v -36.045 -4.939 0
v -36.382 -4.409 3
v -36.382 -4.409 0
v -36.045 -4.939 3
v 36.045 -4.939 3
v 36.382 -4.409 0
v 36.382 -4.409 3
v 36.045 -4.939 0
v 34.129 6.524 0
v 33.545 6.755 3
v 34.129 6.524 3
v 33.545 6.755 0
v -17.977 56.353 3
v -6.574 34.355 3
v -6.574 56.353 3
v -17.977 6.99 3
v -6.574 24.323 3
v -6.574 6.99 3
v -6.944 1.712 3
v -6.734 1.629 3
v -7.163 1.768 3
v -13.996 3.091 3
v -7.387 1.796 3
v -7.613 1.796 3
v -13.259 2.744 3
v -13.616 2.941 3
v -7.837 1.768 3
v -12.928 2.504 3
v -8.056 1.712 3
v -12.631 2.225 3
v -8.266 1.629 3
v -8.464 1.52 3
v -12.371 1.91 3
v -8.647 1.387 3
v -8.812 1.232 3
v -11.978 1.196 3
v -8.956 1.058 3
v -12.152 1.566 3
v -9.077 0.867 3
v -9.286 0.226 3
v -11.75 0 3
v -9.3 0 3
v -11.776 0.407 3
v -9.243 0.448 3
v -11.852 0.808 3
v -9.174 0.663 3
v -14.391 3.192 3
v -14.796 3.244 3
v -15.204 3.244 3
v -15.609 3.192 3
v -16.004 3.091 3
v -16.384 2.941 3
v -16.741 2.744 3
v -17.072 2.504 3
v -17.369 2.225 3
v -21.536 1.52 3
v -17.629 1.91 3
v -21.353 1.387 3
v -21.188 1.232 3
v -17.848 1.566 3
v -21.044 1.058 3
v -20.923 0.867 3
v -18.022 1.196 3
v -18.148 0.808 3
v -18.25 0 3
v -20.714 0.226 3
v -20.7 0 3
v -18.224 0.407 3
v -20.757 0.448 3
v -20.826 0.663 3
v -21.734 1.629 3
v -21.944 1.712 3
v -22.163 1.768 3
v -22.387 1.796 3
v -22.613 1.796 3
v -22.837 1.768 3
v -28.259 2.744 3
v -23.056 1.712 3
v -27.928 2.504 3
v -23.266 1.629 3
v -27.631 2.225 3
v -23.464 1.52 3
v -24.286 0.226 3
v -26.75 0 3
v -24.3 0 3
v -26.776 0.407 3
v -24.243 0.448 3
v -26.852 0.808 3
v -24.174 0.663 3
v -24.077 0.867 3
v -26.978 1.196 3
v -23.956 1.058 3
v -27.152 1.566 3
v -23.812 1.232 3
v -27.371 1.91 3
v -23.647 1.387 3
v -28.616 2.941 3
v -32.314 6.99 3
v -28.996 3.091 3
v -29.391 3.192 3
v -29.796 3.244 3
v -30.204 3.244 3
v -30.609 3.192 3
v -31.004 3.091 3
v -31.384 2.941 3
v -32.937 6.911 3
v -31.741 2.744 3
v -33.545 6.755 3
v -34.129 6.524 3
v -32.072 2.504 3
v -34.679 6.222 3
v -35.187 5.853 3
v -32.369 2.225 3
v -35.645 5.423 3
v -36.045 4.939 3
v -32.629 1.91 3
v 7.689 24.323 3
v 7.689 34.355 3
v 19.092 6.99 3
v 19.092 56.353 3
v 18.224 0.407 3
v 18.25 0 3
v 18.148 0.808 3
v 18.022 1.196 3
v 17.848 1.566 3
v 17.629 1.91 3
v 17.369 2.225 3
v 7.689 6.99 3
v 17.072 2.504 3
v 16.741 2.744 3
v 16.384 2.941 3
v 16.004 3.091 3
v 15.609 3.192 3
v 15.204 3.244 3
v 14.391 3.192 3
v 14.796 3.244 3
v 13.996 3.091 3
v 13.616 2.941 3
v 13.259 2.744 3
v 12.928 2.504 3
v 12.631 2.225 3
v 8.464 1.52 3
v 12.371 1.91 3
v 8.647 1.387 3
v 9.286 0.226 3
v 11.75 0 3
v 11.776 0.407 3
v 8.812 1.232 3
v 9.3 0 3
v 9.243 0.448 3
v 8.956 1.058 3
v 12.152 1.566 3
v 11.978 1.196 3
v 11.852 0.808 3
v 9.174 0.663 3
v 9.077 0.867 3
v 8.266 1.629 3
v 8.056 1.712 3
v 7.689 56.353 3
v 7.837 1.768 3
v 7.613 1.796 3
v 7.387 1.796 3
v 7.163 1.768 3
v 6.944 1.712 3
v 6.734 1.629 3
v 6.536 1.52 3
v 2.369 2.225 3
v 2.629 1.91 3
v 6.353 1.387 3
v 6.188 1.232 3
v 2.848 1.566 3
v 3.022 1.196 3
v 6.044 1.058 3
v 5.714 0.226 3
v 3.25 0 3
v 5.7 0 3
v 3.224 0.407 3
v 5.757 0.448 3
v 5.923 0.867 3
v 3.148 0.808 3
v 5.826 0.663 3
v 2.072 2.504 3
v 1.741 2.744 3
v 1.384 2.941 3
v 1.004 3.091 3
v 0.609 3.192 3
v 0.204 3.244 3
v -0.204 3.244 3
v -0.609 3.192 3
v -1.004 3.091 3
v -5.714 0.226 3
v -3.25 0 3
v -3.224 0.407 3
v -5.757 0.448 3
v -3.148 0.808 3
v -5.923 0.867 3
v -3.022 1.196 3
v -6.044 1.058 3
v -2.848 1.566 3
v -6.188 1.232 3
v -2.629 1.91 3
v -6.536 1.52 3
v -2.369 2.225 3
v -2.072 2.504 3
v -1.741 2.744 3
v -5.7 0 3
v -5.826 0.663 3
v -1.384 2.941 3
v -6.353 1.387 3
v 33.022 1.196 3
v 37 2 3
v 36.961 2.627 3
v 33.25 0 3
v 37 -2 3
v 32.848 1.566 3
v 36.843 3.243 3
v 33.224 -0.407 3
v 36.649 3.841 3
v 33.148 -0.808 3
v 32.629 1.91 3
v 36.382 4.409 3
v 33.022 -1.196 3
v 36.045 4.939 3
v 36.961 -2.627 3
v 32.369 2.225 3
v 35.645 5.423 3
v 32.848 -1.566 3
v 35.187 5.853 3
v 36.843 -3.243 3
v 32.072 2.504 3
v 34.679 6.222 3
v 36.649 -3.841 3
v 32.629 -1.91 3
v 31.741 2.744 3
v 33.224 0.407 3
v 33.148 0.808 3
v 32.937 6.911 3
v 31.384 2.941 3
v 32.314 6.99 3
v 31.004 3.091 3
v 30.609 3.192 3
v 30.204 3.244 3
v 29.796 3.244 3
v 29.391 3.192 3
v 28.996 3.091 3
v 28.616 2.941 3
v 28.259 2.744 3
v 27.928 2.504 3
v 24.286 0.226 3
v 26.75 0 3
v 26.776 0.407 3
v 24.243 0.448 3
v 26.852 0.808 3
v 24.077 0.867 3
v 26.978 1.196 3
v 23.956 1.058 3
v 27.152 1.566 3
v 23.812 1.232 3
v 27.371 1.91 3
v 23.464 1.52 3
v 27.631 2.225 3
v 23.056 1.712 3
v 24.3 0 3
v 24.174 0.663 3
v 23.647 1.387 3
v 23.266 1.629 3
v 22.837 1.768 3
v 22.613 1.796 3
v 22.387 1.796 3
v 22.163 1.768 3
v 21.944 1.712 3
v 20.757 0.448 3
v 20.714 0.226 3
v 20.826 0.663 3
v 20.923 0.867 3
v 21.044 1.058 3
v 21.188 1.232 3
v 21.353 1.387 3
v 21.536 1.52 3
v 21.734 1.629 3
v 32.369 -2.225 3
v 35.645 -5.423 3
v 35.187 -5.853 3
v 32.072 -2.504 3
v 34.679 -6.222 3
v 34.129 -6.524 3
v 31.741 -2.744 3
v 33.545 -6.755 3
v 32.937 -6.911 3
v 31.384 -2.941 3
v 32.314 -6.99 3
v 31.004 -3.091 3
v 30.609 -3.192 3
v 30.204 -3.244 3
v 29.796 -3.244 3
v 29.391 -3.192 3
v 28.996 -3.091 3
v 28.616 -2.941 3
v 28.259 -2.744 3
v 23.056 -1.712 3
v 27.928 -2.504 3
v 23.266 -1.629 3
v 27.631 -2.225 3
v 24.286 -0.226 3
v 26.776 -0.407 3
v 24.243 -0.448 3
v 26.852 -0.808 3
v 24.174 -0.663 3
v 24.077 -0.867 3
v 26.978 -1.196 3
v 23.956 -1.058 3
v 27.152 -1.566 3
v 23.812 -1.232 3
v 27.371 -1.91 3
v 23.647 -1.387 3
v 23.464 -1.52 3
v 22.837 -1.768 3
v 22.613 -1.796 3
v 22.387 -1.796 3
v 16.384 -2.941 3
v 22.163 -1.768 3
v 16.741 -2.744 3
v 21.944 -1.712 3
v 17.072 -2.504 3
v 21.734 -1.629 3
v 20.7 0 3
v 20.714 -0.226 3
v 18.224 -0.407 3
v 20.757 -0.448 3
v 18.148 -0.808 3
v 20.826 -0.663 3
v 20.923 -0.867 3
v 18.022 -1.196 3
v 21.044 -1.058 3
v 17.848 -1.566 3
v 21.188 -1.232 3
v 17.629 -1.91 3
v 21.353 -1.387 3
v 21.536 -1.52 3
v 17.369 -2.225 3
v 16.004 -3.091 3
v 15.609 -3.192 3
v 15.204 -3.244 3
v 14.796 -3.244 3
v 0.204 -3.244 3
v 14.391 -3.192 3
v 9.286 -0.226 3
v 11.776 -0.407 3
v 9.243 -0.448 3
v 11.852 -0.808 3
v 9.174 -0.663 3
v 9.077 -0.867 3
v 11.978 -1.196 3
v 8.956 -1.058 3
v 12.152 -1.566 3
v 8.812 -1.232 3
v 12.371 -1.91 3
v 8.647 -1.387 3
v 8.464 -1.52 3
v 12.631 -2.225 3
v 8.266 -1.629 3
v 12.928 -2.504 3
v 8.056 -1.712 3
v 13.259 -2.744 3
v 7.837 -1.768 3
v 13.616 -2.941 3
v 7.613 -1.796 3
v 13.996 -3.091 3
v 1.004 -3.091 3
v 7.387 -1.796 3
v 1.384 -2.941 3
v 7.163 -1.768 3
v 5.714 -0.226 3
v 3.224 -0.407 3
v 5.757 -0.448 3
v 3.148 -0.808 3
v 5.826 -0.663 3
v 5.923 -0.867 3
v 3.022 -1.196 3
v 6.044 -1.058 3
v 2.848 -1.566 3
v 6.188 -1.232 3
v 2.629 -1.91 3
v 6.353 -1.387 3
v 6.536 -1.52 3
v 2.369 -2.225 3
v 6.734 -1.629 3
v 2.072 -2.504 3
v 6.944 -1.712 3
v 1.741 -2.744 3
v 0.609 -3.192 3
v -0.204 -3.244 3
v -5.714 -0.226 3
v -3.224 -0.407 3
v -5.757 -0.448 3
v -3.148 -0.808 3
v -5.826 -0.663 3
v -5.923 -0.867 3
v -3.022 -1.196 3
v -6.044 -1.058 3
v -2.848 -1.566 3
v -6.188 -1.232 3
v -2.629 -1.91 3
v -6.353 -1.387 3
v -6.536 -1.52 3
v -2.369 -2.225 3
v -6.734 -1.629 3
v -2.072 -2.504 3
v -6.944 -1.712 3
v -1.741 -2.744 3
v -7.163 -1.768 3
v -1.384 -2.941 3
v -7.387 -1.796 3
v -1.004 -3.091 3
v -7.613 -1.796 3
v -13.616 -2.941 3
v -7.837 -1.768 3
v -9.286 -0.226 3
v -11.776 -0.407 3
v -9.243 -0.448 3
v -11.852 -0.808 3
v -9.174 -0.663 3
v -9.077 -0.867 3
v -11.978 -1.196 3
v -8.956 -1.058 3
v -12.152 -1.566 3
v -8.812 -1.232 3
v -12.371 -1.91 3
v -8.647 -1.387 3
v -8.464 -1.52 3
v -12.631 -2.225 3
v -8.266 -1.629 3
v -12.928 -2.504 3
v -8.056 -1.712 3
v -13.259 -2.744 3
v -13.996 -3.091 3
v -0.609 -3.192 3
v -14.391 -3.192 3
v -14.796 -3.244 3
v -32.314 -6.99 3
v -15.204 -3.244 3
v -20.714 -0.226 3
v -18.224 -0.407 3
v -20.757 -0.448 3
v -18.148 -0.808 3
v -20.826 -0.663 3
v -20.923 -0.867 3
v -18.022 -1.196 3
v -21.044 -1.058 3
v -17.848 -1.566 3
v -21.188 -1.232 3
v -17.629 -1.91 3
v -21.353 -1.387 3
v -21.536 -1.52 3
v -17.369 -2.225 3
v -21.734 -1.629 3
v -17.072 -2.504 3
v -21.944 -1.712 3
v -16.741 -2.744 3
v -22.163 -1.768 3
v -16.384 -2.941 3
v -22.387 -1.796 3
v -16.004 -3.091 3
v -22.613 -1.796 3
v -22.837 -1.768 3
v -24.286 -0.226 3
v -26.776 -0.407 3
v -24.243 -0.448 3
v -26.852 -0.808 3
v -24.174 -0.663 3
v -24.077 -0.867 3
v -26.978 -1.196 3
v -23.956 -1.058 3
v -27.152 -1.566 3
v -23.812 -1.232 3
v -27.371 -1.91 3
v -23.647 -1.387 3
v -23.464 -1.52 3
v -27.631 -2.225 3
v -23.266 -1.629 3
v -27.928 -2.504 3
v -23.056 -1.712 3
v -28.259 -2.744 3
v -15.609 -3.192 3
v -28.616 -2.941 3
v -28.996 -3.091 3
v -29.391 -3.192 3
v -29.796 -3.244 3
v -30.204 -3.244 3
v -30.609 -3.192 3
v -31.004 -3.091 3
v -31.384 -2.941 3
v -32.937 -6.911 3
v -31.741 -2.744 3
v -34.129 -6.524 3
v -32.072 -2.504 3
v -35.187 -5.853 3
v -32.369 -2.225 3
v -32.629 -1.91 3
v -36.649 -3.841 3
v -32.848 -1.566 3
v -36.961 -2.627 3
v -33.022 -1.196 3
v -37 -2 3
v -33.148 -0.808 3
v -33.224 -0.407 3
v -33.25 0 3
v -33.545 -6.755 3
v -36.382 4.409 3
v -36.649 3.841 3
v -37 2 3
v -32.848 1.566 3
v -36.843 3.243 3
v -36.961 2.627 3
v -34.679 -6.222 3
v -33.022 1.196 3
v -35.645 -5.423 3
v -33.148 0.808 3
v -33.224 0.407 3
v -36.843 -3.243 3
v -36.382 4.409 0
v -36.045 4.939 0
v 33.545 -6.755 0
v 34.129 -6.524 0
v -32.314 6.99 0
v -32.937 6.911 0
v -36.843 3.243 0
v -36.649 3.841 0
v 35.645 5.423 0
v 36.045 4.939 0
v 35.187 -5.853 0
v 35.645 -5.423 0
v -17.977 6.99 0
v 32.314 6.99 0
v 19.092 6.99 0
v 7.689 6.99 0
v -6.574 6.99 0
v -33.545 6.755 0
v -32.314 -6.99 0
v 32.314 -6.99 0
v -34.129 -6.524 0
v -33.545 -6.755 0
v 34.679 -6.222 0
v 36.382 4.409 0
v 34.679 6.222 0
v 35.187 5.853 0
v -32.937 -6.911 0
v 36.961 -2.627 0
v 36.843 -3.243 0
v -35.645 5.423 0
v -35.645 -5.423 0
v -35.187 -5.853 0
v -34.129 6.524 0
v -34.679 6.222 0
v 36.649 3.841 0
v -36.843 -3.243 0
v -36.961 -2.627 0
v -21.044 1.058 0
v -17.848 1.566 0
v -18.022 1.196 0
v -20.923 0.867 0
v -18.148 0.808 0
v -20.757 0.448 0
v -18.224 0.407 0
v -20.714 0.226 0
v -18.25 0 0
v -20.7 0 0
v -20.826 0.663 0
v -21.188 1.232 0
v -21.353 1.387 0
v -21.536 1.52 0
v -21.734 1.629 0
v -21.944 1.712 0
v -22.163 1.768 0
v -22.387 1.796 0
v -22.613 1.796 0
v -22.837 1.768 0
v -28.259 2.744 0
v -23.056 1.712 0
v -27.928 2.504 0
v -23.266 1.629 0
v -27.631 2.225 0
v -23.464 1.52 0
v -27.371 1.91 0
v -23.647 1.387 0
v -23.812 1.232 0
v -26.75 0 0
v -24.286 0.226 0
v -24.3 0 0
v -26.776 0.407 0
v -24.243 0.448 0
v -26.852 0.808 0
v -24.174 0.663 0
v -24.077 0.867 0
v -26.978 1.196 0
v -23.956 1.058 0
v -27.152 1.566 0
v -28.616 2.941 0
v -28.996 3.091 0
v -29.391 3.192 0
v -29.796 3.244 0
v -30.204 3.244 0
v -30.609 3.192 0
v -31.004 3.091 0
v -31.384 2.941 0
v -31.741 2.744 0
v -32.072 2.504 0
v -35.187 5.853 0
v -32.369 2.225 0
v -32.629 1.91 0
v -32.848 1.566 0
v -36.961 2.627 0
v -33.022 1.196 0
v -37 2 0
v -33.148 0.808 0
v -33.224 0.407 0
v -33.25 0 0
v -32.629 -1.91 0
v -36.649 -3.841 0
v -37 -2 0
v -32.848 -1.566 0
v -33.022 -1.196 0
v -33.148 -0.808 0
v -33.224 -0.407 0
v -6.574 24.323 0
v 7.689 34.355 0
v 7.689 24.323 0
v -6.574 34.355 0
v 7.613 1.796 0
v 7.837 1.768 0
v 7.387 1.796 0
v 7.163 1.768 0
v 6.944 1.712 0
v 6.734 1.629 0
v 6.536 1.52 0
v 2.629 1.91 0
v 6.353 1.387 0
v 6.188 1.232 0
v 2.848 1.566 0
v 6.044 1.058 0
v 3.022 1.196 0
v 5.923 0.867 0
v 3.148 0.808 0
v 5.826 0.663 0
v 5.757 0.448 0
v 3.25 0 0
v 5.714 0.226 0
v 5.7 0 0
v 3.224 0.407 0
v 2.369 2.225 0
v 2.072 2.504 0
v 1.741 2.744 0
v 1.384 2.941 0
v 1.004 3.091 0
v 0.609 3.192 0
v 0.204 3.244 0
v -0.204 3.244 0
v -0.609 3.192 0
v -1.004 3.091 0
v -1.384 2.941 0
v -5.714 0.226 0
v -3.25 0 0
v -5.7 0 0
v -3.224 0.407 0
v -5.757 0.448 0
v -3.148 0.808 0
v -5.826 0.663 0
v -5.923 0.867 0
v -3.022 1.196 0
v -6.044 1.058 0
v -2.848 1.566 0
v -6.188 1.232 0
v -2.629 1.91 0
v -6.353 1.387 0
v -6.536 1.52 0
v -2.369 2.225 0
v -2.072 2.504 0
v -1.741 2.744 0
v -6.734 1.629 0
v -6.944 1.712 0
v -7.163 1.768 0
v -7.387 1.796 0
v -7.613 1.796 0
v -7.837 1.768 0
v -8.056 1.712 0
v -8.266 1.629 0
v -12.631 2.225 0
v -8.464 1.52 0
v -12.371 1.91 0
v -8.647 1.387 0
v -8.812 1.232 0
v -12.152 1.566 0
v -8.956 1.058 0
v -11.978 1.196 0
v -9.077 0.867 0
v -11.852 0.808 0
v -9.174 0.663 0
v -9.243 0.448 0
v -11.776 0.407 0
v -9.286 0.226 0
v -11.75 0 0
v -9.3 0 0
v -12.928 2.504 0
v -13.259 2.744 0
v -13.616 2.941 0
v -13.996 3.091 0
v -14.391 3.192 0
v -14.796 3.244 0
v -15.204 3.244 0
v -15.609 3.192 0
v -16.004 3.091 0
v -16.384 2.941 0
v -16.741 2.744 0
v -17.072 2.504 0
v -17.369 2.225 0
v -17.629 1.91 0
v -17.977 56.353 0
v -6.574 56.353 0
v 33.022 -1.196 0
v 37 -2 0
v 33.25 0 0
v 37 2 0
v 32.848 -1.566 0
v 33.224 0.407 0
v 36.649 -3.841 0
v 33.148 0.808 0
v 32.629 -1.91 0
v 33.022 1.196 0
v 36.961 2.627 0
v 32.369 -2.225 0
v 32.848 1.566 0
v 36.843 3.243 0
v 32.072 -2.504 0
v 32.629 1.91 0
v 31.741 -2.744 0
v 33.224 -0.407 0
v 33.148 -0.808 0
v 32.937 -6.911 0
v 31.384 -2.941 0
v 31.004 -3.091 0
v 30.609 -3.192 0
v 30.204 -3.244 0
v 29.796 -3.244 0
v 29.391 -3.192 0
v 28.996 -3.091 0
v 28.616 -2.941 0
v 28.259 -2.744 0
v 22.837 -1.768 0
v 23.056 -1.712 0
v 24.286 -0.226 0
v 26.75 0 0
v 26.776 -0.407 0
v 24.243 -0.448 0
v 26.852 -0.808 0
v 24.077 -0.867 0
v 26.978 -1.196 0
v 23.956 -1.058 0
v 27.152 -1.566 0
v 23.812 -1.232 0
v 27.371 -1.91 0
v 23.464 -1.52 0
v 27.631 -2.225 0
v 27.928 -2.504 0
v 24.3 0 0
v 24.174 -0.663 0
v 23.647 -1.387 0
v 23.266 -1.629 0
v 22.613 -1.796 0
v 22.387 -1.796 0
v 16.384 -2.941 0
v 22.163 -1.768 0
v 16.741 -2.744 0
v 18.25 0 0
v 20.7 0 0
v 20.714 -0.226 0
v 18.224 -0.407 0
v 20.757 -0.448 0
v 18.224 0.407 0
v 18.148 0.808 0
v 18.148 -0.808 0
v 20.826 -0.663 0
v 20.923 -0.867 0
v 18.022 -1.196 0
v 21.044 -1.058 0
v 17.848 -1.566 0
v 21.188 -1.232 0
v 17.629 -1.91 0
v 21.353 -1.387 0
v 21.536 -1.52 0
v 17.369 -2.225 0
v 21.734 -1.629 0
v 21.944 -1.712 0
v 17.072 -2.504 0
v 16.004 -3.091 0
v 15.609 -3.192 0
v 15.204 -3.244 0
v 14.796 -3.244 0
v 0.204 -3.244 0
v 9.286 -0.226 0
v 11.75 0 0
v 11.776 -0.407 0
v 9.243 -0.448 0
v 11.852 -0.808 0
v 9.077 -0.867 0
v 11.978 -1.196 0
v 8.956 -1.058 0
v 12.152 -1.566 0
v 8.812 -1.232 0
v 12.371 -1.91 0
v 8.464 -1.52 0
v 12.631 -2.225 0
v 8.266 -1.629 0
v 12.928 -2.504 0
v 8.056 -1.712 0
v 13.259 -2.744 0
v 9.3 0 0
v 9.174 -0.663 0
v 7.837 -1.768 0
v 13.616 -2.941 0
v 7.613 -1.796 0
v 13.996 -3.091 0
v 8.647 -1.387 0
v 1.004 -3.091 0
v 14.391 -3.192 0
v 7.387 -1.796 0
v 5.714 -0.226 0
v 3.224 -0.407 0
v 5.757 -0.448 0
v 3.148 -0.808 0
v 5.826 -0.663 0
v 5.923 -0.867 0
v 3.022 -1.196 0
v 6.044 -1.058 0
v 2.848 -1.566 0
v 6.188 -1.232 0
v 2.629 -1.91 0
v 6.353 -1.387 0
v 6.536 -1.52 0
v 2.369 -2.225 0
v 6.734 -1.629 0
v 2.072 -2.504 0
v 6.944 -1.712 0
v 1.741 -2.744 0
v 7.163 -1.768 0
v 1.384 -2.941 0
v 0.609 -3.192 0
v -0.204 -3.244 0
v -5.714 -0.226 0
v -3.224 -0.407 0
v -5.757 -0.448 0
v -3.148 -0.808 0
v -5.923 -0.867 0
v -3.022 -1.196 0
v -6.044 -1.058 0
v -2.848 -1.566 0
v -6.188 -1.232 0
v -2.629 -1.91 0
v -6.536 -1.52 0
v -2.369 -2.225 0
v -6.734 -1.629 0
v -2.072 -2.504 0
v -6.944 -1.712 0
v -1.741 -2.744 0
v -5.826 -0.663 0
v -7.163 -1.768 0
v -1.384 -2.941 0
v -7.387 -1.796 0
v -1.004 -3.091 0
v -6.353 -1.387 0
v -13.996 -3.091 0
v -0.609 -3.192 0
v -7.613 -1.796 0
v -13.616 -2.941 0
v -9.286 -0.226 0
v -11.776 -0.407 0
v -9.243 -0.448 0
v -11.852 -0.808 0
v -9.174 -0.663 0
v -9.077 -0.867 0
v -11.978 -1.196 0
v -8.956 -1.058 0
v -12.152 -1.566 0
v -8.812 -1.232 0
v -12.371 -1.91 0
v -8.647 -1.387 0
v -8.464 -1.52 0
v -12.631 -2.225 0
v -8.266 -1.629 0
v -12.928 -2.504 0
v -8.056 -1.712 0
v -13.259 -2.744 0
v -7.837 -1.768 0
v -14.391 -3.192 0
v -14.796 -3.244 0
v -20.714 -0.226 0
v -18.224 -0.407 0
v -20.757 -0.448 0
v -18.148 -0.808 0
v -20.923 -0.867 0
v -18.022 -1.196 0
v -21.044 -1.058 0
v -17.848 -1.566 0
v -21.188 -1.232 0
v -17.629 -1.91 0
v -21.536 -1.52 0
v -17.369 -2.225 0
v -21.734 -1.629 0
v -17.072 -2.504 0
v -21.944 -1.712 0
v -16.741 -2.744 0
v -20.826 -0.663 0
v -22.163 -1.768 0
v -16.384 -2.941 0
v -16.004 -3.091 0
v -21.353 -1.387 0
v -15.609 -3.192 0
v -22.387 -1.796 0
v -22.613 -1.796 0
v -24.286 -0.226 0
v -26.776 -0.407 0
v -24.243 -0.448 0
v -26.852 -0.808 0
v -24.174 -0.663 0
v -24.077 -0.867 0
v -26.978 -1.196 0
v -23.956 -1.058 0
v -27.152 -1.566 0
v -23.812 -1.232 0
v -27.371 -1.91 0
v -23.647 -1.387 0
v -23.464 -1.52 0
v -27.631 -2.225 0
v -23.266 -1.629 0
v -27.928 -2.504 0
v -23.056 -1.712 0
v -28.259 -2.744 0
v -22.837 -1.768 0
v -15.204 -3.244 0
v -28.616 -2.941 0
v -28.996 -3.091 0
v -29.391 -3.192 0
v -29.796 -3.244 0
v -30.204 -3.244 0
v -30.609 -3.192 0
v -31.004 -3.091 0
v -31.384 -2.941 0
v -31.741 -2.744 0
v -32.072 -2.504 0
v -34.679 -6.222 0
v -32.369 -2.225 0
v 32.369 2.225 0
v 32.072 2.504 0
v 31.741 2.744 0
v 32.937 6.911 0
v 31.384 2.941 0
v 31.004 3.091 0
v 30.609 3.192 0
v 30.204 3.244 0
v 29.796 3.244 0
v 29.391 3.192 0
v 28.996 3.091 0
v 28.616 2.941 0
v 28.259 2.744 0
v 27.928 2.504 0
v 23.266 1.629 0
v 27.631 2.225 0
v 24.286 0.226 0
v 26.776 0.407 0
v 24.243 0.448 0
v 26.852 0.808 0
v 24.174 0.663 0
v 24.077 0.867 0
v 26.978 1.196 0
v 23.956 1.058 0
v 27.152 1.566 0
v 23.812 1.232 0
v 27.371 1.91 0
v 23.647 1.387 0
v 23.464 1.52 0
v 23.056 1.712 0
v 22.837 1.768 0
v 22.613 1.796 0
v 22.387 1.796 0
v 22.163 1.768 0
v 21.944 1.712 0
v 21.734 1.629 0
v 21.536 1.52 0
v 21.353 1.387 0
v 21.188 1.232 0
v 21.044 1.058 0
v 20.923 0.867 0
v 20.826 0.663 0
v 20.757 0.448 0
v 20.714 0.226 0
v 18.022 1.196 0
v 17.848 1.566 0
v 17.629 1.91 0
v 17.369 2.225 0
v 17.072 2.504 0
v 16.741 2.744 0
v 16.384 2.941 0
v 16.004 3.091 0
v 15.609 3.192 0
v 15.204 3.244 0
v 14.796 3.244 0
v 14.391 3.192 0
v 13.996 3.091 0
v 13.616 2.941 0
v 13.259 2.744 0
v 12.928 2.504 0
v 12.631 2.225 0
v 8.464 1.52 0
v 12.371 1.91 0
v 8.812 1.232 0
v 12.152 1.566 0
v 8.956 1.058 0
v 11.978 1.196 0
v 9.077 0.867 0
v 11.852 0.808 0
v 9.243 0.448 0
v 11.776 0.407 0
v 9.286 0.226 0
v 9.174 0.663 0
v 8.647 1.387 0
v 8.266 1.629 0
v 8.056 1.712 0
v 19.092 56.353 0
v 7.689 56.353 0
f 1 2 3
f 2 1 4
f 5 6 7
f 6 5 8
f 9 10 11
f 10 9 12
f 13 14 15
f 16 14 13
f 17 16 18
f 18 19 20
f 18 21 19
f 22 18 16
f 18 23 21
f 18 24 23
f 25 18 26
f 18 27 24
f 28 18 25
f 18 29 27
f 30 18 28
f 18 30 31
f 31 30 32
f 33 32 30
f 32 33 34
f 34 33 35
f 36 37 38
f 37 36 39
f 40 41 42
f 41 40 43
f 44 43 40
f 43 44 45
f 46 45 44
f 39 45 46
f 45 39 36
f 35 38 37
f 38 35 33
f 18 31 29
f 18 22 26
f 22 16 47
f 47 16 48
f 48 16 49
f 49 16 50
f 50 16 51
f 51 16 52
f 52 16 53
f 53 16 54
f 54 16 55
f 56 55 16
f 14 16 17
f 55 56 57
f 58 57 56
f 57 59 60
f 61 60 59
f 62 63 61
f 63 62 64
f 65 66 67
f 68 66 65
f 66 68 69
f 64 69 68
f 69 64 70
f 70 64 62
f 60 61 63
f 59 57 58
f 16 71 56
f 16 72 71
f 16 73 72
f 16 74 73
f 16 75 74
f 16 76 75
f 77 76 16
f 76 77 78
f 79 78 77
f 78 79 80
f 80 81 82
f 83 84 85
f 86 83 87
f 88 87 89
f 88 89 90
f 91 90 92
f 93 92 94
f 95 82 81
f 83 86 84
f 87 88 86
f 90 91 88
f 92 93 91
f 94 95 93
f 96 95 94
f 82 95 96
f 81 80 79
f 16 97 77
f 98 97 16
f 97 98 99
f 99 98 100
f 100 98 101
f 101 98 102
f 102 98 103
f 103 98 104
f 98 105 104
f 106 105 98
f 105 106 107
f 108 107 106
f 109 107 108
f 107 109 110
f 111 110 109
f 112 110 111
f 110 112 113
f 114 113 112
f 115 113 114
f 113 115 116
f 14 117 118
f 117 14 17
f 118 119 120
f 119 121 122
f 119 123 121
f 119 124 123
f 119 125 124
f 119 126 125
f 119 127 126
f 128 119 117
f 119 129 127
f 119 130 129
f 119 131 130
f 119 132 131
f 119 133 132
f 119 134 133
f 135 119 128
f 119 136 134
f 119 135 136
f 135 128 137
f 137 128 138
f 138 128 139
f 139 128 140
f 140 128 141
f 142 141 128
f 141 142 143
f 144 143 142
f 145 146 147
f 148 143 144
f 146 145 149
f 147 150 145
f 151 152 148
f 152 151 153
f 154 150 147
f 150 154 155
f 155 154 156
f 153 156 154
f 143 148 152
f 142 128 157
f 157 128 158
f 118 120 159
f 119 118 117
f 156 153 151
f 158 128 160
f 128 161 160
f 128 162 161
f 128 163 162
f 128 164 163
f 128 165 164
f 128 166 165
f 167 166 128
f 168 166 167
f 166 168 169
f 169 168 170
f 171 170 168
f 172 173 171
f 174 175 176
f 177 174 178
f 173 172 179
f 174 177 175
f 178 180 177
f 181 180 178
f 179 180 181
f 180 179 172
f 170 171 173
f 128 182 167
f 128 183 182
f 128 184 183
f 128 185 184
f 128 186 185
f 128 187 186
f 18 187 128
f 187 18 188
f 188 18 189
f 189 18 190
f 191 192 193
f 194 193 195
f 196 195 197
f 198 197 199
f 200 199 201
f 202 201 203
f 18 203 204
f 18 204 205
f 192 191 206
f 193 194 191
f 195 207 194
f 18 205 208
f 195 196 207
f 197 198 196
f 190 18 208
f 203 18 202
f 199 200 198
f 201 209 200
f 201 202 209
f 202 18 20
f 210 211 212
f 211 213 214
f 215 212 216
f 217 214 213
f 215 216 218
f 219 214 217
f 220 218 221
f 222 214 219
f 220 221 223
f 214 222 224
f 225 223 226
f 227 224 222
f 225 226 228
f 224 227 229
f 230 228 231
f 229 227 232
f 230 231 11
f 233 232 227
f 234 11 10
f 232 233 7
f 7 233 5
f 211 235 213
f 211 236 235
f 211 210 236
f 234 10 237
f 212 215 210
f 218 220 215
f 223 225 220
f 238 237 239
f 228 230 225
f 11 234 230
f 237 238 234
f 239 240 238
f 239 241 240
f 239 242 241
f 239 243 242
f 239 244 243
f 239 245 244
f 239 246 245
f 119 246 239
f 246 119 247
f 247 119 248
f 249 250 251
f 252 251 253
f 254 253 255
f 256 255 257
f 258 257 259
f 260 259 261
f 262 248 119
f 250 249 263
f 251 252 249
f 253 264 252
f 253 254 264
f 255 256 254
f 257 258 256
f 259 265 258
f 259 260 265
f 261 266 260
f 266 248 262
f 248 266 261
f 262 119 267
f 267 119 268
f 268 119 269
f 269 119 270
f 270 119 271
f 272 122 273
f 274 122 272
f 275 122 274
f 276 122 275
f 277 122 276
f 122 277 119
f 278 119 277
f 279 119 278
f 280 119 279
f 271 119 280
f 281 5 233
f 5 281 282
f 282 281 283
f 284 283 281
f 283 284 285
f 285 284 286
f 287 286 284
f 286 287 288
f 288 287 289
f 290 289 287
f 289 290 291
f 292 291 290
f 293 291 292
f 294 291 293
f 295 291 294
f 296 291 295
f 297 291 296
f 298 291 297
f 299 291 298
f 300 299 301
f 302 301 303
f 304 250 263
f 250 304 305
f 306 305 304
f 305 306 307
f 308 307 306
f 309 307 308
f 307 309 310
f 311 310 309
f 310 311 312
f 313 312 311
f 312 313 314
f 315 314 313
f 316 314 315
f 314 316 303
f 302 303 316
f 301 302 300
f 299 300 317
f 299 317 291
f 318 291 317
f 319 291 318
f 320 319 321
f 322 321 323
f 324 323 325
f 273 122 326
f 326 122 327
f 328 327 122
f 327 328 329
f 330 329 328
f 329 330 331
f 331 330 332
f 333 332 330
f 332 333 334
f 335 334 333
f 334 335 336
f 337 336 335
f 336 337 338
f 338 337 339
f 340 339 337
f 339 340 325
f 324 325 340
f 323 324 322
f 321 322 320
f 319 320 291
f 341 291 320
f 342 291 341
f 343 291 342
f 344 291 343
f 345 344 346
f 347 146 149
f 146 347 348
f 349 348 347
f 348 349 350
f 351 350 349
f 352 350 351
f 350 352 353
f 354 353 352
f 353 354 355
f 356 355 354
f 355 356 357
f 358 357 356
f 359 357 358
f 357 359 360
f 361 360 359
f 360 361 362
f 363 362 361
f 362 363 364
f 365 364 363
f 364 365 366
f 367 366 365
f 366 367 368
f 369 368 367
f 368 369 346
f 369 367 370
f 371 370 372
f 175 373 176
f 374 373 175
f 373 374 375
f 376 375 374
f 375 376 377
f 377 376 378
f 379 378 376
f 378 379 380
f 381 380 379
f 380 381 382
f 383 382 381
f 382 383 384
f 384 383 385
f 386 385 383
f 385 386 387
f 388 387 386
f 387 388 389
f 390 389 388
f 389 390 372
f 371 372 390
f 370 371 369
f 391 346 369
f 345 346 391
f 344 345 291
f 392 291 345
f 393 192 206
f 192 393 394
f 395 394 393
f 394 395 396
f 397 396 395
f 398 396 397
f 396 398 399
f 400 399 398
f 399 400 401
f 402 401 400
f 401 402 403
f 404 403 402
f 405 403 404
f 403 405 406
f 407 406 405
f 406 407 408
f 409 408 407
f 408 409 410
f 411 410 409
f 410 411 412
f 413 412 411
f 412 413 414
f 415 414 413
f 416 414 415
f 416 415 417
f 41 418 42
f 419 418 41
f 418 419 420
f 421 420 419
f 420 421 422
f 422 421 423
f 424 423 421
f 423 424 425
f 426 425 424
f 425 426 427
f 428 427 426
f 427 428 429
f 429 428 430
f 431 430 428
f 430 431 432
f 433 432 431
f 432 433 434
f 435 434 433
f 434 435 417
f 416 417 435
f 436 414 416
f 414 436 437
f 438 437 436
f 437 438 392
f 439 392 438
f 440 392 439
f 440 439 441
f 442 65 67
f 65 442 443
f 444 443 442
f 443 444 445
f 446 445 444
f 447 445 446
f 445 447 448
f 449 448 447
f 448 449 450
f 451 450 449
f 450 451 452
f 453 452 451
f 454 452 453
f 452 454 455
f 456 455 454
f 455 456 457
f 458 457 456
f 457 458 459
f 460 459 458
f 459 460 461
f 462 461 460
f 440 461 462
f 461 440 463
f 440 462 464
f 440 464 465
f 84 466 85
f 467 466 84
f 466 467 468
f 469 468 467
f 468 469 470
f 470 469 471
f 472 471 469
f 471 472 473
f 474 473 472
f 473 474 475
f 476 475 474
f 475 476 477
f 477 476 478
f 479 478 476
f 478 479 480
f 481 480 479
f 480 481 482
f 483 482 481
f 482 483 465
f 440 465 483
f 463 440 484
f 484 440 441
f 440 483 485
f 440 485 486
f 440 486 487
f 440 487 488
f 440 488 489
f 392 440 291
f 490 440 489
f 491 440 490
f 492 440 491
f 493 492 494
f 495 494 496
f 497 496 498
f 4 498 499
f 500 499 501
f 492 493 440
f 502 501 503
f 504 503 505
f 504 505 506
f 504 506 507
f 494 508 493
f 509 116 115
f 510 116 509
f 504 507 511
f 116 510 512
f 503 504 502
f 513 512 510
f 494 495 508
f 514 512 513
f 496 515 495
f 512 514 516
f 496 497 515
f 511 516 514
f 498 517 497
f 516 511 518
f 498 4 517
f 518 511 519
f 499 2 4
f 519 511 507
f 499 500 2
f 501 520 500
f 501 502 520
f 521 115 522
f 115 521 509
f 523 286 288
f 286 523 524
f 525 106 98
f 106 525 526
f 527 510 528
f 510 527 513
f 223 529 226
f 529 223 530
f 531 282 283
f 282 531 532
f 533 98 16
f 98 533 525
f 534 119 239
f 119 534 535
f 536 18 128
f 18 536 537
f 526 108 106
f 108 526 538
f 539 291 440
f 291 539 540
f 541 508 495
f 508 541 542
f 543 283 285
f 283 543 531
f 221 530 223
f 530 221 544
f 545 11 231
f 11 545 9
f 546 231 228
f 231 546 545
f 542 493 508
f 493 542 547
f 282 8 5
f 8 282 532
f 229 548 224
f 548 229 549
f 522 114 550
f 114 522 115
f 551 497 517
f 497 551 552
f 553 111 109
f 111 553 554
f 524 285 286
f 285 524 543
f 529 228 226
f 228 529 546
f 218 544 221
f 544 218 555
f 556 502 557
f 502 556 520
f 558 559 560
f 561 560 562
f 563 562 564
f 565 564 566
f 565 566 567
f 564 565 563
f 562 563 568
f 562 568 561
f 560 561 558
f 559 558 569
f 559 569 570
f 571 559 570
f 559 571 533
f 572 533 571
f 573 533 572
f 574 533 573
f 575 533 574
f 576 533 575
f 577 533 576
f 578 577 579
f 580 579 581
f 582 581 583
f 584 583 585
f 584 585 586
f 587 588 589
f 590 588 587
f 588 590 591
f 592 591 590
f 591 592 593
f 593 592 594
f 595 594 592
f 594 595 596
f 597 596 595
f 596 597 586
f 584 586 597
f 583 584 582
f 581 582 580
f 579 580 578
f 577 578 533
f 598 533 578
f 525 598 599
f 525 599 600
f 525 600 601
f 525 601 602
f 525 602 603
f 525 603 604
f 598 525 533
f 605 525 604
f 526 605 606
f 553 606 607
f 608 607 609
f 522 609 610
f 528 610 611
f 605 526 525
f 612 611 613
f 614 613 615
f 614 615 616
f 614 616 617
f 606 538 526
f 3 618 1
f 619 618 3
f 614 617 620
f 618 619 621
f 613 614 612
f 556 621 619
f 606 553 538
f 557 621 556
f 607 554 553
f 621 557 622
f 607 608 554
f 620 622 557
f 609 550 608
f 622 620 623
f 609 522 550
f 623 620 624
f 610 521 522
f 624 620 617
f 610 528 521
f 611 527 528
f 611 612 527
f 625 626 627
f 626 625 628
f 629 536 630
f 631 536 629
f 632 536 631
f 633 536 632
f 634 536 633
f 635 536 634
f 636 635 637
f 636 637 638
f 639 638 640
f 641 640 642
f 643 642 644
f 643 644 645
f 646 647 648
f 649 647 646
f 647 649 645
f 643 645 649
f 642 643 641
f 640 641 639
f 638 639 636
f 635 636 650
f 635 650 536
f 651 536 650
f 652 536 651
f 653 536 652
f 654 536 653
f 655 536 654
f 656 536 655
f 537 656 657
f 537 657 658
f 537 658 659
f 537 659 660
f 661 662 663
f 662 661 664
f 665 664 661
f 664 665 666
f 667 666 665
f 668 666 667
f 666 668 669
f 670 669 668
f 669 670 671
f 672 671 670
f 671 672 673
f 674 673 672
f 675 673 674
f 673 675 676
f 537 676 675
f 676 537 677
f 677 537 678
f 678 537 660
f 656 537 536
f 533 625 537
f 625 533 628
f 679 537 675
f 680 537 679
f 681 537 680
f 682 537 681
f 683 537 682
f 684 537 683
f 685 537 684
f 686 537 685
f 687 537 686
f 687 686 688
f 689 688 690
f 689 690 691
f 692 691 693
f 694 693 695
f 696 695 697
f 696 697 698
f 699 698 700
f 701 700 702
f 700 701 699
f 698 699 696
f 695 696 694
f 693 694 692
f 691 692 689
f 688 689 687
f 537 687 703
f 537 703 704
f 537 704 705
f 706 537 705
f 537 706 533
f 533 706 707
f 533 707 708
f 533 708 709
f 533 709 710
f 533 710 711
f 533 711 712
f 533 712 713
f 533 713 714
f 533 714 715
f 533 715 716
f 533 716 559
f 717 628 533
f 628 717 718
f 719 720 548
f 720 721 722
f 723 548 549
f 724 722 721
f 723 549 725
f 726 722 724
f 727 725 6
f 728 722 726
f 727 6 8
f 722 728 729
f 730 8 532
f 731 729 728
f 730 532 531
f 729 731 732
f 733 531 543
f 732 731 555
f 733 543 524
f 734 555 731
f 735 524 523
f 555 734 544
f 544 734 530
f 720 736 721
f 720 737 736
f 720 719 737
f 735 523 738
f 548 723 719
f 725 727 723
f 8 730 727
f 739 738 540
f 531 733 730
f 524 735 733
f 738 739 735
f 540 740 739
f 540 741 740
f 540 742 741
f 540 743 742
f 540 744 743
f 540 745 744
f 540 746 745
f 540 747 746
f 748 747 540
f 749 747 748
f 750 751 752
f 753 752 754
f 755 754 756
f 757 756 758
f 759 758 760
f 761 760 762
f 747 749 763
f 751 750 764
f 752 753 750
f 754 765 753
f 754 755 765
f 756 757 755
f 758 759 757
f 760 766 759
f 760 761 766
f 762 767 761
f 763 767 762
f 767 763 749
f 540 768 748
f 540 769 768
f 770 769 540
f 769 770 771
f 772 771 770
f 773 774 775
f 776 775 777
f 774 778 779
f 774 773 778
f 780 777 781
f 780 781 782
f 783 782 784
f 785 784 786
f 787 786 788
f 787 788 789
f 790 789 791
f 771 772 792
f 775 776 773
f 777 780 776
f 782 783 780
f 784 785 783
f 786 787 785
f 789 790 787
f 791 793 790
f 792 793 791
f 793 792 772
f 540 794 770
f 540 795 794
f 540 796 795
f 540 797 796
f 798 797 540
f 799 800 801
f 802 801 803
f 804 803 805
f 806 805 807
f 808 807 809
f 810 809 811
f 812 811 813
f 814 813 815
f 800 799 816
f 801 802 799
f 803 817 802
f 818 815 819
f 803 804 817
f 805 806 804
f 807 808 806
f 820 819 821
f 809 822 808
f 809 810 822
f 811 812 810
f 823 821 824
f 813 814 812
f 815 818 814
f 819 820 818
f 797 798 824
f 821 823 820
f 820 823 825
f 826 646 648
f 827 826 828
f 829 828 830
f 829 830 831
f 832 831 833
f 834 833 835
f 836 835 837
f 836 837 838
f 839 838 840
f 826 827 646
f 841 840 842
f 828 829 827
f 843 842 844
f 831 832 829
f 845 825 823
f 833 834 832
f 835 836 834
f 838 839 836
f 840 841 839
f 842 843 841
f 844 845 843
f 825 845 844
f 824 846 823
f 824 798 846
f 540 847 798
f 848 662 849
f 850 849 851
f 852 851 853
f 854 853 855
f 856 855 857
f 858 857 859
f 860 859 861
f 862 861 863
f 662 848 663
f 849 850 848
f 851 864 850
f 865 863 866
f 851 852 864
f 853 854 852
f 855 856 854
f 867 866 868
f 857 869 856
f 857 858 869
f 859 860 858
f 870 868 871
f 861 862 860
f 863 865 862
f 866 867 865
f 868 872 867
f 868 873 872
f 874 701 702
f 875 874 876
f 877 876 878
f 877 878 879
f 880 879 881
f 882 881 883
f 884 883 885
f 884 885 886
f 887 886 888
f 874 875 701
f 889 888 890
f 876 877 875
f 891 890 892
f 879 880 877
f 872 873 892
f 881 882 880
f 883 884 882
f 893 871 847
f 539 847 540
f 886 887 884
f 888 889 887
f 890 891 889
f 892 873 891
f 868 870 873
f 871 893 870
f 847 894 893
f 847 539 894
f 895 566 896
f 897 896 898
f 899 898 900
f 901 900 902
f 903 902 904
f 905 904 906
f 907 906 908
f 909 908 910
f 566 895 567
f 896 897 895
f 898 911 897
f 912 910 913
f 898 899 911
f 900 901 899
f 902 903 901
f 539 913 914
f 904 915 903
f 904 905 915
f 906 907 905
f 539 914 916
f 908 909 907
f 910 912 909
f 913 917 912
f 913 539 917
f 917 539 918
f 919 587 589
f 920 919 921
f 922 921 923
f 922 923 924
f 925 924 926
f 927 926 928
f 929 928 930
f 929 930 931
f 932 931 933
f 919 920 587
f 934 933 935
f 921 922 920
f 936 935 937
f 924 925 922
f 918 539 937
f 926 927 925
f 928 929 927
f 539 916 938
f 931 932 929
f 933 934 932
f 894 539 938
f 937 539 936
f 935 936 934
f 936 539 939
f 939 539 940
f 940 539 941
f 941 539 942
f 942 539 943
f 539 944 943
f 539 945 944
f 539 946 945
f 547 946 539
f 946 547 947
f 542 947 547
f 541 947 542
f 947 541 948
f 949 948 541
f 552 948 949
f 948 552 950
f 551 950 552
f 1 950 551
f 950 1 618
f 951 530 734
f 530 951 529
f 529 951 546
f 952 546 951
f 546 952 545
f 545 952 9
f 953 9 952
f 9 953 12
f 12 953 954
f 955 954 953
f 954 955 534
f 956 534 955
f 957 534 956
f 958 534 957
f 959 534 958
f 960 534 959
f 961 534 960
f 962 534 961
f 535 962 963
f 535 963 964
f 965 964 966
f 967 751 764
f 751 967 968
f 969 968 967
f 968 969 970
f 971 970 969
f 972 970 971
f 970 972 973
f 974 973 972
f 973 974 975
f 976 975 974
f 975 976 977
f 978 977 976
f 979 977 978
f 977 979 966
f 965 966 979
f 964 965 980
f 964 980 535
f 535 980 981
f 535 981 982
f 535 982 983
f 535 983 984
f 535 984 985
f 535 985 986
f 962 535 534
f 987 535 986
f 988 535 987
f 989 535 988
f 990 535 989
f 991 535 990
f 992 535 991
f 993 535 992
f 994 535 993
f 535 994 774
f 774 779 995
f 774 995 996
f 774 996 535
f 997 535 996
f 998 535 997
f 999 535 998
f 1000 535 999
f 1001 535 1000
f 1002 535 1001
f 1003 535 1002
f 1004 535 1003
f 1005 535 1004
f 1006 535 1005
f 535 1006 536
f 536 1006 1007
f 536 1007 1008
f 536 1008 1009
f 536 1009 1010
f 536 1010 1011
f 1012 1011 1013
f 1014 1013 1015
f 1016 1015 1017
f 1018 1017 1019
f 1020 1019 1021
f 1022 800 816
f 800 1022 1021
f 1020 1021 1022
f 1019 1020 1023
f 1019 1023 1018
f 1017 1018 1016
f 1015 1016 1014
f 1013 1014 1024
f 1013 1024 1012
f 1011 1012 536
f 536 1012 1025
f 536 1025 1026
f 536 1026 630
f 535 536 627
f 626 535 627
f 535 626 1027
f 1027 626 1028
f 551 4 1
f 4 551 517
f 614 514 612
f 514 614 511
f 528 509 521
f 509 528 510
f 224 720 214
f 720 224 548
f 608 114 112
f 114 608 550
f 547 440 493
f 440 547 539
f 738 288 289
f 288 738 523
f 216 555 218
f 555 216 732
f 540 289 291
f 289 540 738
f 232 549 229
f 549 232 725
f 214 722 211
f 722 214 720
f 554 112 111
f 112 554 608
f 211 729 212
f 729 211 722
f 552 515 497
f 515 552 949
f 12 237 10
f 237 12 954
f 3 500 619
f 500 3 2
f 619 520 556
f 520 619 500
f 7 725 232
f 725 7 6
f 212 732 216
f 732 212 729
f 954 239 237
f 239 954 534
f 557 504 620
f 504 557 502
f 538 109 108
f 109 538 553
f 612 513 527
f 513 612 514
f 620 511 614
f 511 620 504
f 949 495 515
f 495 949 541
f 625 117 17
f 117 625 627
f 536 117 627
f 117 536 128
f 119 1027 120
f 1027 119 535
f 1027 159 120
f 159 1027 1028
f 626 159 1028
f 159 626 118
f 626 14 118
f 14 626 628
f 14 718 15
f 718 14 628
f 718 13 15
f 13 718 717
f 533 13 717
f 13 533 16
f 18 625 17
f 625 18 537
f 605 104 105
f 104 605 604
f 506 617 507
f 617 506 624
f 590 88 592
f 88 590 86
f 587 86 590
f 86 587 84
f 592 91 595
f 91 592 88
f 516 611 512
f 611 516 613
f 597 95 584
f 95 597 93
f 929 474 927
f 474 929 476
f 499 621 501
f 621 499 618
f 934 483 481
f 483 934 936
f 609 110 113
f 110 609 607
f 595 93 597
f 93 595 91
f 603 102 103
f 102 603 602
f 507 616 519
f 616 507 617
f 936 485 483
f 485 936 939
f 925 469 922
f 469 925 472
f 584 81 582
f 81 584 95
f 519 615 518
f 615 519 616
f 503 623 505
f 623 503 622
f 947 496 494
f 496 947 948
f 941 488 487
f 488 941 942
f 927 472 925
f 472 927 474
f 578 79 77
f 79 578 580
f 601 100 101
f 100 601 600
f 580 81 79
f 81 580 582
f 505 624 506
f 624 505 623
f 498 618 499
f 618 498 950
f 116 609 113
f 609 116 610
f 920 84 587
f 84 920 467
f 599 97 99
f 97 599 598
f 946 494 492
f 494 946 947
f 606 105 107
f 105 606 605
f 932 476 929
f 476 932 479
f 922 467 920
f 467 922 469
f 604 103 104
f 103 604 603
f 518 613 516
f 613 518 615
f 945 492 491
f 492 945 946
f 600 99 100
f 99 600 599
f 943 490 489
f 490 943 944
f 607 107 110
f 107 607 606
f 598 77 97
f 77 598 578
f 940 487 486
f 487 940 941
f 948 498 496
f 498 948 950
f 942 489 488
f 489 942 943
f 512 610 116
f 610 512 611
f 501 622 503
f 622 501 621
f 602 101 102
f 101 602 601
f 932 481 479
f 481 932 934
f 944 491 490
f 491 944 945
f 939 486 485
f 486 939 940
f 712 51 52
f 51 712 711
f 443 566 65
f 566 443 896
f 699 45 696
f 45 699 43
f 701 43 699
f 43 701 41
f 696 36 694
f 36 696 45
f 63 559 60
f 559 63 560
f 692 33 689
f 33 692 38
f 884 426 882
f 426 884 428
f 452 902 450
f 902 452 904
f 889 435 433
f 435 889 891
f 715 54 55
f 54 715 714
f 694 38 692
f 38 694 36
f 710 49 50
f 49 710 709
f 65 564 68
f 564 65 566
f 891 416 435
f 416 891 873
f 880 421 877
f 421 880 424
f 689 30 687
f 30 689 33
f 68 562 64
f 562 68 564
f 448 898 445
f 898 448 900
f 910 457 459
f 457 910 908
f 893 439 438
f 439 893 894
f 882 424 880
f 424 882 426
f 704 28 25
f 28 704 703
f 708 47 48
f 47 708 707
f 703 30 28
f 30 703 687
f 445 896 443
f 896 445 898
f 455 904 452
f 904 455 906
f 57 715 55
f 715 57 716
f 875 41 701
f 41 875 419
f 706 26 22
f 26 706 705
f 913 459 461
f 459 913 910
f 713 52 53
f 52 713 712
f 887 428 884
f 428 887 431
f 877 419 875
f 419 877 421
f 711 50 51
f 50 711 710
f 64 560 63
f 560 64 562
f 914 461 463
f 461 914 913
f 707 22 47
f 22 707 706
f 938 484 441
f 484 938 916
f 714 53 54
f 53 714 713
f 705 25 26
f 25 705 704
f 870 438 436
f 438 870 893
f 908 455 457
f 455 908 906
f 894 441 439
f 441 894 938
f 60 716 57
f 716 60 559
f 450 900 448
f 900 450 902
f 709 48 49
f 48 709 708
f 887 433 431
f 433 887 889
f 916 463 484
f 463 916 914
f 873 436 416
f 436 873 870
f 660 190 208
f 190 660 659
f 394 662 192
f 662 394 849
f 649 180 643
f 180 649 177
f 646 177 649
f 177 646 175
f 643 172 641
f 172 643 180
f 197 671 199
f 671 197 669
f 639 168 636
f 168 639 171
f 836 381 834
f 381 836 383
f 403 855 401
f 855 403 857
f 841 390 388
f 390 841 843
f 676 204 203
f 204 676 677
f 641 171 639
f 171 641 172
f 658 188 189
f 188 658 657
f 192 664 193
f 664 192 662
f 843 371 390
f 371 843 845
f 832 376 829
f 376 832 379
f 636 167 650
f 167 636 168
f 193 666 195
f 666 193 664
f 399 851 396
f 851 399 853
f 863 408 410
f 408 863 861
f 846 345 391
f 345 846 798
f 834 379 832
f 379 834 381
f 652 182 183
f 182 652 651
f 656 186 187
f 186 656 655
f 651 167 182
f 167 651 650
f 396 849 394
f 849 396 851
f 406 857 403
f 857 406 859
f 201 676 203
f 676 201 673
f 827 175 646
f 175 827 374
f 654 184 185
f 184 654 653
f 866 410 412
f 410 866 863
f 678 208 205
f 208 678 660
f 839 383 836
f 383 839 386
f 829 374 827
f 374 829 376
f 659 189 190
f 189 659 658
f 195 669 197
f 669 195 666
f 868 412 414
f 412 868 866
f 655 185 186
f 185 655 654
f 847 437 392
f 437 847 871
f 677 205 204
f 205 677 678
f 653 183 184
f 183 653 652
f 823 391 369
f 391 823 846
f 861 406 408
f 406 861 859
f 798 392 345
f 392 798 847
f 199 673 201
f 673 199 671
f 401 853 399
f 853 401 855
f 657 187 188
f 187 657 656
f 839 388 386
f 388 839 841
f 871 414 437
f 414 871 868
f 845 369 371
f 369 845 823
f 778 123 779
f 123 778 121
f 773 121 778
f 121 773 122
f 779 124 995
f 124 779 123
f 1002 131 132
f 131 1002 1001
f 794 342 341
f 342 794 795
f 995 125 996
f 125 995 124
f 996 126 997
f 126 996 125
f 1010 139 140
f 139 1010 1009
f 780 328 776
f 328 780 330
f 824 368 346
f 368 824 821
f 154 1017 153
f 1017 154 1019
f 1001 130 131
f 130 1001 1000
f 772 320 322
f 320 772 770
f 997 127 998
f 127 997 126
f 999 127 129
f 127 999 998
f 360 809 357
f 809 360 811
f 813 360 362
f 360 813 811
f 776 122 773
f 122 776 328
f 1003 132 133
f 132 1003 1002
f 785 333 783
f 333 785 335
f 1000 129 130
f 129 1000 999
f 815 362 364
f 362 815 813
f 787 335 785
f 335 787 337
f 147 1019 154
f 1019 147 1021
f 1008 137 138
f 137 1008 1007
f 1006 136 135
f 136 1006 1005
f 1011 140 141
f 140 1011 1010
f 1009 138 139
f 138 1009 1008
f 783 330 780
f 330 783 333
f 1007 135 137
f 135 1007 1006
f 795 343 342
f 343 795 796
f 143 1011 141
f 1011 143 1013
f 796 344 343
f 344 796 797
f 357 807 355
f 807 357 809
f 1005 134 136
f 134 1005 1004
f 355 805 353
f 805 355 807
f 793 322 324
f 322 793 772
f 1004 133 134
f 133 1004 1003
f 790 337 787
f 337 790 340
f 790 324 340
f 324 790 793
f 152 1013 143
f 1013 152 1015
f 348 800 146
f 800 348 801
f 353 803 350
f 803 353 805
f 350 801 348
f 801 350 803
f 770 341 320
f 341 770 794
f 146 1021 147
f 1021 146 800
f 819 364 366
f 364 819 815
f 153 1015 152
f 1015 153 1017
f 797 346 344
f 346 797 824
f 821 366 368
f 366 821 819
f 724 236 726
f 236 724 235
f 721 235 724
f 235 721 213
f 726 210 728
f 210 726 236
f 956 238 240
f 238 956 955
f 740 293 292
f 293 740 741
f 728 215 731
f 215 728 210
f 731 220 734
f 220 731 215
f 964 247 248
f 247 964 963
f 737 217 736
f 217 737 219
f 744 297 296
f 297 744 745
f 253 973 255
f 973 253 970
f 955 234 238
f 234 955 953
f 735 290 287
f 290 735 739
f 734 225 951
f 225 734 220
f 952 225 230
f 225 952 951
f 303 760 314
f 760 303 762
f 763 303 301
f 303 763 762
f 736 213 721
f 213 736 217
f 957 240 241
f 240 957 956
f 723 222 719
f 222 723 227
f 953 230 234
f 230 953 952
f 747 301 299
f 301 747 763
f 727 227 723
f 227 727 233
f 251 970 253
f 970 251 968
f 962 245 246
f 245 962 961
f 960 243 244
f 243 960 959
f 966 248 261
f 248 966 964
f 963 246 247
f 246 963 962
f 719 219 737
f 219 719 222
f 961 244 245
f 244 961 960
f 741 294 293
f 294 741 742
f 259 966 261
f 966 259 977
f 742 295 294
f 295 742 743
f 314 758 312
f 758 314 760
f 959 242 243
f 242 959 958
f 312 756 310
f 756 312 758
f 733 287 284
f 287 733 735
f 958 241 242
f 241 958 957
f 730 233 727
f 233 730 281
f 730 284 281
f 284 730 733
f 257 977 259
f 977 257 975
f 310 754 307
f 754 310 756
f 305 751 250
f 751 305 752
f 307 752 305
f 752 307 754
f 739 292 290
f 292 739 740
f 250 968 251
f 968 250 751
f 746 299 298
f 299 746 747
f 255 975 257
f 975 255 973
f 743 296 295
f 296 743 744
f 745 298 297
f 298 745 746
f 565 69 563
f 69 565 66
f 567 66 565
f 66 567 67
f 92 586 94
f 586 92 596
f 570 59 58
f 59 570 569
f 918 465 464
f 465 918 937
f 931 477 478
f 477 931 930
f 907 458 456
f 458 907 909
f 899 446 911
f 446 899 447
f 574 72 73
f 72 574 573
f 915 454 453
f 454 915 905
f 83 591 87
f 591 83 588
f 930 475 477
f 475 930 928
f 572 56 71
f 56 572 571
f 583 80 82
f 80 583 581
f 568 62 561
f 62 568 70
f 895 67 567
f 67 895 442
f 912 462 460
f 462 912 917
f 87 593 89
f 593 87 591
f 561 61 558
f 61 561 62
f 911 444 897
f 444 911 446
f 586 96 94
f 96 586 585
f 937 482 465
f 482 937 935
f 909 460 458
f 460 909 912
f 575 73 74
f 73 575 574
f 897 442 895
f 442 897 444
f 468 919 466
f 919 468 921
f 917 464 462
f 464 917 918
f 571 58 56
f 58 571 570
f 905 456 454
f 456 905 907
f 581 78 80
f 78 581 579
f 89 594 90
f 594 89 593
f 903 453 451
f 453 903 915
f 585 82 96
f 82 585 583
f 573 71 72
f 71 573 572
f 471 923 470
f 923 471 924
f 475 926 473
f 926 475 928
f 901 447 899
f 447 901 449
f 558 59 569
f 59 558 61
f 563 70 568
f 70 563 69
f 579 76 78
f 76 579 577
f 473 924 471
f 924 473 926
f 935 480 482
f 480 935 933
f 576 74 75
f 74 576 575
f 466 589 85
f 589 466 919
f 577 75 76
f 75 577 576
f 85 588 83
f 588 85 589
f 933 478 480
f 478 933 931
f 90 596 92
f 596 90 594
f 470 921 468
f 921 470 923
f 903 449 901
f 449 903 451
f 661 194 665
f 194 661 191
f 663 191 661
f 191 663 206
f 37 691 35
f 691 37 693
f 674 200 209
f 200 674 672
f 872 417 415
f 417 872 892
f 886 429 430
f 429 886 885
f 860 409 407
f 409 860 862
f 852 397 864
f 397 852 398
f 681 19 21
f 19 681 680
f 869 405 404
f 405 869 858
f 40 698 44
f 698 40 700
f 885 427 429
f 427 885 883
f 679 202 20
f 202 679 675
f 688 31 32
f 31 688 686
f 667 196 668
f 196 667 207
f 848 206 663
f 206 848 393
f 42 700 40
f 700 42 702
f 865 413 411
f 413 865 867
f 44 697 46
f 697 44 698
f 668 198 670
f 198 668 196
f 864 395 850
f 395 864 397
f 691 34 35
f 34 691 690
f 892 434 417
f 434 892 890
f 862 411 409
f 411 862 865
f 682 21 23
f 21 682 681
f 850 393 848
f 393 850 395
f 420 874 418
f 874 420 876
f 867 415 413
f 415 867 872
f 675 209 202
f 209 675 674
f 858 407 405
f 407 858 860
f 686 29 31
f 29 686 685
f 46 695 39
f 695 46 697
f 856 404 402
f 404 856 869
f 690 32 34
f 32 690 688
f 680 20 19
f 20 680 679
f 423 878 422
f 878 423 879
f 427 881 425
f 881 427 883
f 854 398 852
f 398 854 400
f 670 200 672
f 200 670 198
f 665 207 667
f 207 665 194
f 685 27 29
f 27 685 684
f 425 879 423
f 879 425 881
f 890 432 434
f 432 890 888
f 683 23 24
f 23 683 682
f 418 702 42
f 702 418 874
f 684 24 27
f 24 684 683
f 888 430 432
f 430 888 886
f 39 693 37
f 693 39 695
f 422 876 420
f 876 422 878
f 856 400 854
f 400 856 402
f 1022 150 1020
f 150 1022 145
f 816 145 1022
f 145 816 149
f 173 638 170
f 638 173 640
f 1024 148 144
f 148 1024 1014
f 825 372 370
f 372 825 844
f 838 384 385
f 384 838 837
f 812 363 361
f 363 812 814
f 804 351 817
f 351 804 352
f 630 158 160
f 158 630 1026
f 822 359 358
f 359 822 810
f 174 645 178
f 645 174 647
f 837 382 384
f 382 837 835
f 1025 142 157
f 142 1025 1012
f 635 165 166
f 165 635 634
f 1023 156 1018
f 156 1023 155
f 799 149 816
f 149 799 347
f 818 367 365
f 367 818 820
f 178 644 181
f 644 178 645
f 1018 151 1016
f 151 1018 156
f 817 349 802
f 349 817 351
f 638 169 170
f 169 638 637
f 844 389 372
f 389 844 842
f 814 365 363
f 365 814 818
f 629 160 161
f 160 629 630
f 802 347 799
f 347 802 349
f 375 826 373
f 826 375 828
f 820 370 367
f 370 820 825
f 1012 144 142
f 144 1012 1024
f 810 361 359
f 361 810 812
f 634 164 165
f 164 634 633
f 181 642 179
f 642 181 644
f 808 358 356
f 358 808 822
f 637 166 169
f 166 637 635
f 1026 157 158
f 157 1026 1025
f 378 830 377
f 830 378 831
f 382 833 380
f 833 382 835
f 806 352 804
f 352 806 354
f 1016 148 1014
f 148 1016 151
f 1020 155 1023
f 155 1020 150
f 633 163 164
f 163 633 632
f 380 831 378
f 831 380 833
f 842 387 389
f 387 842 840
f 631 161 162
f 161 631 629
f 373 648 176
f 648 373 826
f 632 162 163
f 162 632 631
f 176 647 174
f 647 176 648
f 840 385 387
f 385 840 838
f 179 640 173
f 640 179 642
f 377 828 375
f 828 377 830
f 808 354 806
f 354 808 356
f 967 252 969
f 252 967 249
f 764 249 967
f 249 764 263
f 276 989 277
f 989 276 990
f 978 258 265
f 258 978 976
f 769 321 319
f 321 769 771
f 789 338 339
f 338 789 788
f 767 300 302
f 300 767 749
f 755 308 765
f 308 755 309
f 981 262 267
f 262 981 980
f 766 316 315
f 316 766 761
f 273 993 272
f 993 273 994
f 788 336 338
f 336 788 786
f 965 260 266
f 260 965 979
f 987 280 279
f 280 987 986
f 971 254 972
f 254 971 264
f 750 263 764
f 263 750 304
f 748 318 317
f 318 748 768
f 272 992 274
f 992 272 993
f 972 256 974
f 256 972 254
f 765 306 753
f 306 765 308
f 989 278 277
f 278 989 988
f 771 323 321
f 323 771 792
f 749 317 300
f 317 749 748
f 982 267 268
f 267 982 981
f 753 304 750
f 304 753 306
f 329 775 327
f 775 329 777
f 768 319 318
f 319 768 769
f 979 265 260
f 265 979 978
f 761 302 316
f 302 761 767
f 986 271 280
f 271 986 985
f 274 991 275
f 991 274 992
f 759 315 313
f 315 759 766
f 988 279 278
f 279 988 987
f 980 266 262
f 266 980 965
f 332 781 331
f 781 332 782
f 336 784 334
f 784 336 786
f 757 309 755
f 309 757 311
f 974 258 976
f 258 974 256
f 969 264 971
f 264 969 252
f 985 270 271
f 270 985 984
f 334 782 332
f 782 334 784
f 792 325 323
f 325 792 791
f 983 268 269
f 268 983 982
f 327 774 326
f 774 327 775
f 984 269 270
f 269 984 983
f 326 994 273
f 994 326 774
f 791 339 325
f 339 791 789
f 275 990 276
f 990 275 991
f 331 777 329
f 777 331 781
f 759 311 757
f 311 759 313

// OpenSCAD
$fn = 50;


difference() {
	union() {
		hull() {
			translate(v = [-32.0000000000, 2.0000000000, 0]) {
				cylinder(h = 3, r = 5);
			}
			translate(v = [32.0000000000, 2.0000000000, 0]) {
				cylinder(h = 3, r = 5);
			}
			translate(v = [-32.0000000000, -2.0000000000, 0]) {
				cylinder(h = 3, r = 5);
			}
			translate(v = [32.0000000000, -2.0000000000, 0]) {
				cylinder(h = 3, r = 5);
			}
		}
		translate(v = [0, 55, 0]) {
			linear_extrude(height = 3) {
				text(font = "DejaVu Sans Mono:style=Bold", halign = "center", size = 57.0000000000, text = "H", valign = "top");
			}
		}
	}
	union() {
		translate(v = [-30.0000000000, 0.0000000000, 0]) {
			translate(v = [0, 0, -100]) {
				cylinder(h = 200, r = 3.2500000000);
			}
		}
		translate(v = [-15.0000000000, 0.0000000000, 0]) {
			translate(v = [0, 0, -100]) {
				cylinder(h = 200, r = 3.2500000000);
			}
		}
		translate(v = [0, 0, -100]) {
			cylinder(h = 200, r = 3.2500000000);
		}
		translate(v = [15.0000000000, 0.0000000000, 0]) {
			translate(v = [0, 0, -100]) {
				cylinder(h = 200, r = 3.2500000000);
			}
		}
		translate(v = [30.0000000000, 0.0000000000, 0]) {
			translate(v = [0, 0, -100]) {
				cylinder(h = 200, r = 3.2500000000);
			}
		}
		translate(v = [-30.0000000000, 0.0000000000, 0]) {
			translate(v = [0, 0, -100]) {
				cylinder(h = 200, r = 1.8000000000);
			}
		}
		translate(v = [-22.5000000000, 0.0000000000, 0]) {
			translate(v = [0, 0, -100]) {
				cylinder(h = 200, r = 1.8000000000);
			}
		}
		translate(v = [-15.0000000000, 0.0000000000, 0]) {
			translate(v = [0, 0, -100]) {
				cylinder(h = 200, r = 1.8000000000);
			}
		}
		translate(v = [-7.5000000000, 0.0000000000, 0]) {
			translate(v = [0, 0, -100]) {
				cylinder(h = 200, r = 1.8000000000);
			}
		}
		translate(v = [0, 0, -100]) {
			cylinder(h = 200, r = 1.8000000000);
		}
		translate(v = [7.5000000000, 0.0000000000, 0]) {
			translate(v = [0, 0, -100]) {
				cylinder(h = 200, r = 1.8000000000);
			}
		}
		translate(v = [15.0000000000, 0.0000000000, 0]) {
			translate(v = [0, 0, -100]) {
				cylinder(h = 200, r = 1.8000000000);
			}
		}
		translate(v = [22.5000000000, 0.0000000000, 0]) {
			translate(v = [0, 0, -100]) {
				cylinder(h = 200, r = 1.8000000000);
			}
		}
		translate(v = [30.0000000000, 0.0000000000, 0]) {
			translate(v = [0, 0, -100]) {
				cylinder(h = 200, r = 1.8000000000);
			}
		}
	}
}
